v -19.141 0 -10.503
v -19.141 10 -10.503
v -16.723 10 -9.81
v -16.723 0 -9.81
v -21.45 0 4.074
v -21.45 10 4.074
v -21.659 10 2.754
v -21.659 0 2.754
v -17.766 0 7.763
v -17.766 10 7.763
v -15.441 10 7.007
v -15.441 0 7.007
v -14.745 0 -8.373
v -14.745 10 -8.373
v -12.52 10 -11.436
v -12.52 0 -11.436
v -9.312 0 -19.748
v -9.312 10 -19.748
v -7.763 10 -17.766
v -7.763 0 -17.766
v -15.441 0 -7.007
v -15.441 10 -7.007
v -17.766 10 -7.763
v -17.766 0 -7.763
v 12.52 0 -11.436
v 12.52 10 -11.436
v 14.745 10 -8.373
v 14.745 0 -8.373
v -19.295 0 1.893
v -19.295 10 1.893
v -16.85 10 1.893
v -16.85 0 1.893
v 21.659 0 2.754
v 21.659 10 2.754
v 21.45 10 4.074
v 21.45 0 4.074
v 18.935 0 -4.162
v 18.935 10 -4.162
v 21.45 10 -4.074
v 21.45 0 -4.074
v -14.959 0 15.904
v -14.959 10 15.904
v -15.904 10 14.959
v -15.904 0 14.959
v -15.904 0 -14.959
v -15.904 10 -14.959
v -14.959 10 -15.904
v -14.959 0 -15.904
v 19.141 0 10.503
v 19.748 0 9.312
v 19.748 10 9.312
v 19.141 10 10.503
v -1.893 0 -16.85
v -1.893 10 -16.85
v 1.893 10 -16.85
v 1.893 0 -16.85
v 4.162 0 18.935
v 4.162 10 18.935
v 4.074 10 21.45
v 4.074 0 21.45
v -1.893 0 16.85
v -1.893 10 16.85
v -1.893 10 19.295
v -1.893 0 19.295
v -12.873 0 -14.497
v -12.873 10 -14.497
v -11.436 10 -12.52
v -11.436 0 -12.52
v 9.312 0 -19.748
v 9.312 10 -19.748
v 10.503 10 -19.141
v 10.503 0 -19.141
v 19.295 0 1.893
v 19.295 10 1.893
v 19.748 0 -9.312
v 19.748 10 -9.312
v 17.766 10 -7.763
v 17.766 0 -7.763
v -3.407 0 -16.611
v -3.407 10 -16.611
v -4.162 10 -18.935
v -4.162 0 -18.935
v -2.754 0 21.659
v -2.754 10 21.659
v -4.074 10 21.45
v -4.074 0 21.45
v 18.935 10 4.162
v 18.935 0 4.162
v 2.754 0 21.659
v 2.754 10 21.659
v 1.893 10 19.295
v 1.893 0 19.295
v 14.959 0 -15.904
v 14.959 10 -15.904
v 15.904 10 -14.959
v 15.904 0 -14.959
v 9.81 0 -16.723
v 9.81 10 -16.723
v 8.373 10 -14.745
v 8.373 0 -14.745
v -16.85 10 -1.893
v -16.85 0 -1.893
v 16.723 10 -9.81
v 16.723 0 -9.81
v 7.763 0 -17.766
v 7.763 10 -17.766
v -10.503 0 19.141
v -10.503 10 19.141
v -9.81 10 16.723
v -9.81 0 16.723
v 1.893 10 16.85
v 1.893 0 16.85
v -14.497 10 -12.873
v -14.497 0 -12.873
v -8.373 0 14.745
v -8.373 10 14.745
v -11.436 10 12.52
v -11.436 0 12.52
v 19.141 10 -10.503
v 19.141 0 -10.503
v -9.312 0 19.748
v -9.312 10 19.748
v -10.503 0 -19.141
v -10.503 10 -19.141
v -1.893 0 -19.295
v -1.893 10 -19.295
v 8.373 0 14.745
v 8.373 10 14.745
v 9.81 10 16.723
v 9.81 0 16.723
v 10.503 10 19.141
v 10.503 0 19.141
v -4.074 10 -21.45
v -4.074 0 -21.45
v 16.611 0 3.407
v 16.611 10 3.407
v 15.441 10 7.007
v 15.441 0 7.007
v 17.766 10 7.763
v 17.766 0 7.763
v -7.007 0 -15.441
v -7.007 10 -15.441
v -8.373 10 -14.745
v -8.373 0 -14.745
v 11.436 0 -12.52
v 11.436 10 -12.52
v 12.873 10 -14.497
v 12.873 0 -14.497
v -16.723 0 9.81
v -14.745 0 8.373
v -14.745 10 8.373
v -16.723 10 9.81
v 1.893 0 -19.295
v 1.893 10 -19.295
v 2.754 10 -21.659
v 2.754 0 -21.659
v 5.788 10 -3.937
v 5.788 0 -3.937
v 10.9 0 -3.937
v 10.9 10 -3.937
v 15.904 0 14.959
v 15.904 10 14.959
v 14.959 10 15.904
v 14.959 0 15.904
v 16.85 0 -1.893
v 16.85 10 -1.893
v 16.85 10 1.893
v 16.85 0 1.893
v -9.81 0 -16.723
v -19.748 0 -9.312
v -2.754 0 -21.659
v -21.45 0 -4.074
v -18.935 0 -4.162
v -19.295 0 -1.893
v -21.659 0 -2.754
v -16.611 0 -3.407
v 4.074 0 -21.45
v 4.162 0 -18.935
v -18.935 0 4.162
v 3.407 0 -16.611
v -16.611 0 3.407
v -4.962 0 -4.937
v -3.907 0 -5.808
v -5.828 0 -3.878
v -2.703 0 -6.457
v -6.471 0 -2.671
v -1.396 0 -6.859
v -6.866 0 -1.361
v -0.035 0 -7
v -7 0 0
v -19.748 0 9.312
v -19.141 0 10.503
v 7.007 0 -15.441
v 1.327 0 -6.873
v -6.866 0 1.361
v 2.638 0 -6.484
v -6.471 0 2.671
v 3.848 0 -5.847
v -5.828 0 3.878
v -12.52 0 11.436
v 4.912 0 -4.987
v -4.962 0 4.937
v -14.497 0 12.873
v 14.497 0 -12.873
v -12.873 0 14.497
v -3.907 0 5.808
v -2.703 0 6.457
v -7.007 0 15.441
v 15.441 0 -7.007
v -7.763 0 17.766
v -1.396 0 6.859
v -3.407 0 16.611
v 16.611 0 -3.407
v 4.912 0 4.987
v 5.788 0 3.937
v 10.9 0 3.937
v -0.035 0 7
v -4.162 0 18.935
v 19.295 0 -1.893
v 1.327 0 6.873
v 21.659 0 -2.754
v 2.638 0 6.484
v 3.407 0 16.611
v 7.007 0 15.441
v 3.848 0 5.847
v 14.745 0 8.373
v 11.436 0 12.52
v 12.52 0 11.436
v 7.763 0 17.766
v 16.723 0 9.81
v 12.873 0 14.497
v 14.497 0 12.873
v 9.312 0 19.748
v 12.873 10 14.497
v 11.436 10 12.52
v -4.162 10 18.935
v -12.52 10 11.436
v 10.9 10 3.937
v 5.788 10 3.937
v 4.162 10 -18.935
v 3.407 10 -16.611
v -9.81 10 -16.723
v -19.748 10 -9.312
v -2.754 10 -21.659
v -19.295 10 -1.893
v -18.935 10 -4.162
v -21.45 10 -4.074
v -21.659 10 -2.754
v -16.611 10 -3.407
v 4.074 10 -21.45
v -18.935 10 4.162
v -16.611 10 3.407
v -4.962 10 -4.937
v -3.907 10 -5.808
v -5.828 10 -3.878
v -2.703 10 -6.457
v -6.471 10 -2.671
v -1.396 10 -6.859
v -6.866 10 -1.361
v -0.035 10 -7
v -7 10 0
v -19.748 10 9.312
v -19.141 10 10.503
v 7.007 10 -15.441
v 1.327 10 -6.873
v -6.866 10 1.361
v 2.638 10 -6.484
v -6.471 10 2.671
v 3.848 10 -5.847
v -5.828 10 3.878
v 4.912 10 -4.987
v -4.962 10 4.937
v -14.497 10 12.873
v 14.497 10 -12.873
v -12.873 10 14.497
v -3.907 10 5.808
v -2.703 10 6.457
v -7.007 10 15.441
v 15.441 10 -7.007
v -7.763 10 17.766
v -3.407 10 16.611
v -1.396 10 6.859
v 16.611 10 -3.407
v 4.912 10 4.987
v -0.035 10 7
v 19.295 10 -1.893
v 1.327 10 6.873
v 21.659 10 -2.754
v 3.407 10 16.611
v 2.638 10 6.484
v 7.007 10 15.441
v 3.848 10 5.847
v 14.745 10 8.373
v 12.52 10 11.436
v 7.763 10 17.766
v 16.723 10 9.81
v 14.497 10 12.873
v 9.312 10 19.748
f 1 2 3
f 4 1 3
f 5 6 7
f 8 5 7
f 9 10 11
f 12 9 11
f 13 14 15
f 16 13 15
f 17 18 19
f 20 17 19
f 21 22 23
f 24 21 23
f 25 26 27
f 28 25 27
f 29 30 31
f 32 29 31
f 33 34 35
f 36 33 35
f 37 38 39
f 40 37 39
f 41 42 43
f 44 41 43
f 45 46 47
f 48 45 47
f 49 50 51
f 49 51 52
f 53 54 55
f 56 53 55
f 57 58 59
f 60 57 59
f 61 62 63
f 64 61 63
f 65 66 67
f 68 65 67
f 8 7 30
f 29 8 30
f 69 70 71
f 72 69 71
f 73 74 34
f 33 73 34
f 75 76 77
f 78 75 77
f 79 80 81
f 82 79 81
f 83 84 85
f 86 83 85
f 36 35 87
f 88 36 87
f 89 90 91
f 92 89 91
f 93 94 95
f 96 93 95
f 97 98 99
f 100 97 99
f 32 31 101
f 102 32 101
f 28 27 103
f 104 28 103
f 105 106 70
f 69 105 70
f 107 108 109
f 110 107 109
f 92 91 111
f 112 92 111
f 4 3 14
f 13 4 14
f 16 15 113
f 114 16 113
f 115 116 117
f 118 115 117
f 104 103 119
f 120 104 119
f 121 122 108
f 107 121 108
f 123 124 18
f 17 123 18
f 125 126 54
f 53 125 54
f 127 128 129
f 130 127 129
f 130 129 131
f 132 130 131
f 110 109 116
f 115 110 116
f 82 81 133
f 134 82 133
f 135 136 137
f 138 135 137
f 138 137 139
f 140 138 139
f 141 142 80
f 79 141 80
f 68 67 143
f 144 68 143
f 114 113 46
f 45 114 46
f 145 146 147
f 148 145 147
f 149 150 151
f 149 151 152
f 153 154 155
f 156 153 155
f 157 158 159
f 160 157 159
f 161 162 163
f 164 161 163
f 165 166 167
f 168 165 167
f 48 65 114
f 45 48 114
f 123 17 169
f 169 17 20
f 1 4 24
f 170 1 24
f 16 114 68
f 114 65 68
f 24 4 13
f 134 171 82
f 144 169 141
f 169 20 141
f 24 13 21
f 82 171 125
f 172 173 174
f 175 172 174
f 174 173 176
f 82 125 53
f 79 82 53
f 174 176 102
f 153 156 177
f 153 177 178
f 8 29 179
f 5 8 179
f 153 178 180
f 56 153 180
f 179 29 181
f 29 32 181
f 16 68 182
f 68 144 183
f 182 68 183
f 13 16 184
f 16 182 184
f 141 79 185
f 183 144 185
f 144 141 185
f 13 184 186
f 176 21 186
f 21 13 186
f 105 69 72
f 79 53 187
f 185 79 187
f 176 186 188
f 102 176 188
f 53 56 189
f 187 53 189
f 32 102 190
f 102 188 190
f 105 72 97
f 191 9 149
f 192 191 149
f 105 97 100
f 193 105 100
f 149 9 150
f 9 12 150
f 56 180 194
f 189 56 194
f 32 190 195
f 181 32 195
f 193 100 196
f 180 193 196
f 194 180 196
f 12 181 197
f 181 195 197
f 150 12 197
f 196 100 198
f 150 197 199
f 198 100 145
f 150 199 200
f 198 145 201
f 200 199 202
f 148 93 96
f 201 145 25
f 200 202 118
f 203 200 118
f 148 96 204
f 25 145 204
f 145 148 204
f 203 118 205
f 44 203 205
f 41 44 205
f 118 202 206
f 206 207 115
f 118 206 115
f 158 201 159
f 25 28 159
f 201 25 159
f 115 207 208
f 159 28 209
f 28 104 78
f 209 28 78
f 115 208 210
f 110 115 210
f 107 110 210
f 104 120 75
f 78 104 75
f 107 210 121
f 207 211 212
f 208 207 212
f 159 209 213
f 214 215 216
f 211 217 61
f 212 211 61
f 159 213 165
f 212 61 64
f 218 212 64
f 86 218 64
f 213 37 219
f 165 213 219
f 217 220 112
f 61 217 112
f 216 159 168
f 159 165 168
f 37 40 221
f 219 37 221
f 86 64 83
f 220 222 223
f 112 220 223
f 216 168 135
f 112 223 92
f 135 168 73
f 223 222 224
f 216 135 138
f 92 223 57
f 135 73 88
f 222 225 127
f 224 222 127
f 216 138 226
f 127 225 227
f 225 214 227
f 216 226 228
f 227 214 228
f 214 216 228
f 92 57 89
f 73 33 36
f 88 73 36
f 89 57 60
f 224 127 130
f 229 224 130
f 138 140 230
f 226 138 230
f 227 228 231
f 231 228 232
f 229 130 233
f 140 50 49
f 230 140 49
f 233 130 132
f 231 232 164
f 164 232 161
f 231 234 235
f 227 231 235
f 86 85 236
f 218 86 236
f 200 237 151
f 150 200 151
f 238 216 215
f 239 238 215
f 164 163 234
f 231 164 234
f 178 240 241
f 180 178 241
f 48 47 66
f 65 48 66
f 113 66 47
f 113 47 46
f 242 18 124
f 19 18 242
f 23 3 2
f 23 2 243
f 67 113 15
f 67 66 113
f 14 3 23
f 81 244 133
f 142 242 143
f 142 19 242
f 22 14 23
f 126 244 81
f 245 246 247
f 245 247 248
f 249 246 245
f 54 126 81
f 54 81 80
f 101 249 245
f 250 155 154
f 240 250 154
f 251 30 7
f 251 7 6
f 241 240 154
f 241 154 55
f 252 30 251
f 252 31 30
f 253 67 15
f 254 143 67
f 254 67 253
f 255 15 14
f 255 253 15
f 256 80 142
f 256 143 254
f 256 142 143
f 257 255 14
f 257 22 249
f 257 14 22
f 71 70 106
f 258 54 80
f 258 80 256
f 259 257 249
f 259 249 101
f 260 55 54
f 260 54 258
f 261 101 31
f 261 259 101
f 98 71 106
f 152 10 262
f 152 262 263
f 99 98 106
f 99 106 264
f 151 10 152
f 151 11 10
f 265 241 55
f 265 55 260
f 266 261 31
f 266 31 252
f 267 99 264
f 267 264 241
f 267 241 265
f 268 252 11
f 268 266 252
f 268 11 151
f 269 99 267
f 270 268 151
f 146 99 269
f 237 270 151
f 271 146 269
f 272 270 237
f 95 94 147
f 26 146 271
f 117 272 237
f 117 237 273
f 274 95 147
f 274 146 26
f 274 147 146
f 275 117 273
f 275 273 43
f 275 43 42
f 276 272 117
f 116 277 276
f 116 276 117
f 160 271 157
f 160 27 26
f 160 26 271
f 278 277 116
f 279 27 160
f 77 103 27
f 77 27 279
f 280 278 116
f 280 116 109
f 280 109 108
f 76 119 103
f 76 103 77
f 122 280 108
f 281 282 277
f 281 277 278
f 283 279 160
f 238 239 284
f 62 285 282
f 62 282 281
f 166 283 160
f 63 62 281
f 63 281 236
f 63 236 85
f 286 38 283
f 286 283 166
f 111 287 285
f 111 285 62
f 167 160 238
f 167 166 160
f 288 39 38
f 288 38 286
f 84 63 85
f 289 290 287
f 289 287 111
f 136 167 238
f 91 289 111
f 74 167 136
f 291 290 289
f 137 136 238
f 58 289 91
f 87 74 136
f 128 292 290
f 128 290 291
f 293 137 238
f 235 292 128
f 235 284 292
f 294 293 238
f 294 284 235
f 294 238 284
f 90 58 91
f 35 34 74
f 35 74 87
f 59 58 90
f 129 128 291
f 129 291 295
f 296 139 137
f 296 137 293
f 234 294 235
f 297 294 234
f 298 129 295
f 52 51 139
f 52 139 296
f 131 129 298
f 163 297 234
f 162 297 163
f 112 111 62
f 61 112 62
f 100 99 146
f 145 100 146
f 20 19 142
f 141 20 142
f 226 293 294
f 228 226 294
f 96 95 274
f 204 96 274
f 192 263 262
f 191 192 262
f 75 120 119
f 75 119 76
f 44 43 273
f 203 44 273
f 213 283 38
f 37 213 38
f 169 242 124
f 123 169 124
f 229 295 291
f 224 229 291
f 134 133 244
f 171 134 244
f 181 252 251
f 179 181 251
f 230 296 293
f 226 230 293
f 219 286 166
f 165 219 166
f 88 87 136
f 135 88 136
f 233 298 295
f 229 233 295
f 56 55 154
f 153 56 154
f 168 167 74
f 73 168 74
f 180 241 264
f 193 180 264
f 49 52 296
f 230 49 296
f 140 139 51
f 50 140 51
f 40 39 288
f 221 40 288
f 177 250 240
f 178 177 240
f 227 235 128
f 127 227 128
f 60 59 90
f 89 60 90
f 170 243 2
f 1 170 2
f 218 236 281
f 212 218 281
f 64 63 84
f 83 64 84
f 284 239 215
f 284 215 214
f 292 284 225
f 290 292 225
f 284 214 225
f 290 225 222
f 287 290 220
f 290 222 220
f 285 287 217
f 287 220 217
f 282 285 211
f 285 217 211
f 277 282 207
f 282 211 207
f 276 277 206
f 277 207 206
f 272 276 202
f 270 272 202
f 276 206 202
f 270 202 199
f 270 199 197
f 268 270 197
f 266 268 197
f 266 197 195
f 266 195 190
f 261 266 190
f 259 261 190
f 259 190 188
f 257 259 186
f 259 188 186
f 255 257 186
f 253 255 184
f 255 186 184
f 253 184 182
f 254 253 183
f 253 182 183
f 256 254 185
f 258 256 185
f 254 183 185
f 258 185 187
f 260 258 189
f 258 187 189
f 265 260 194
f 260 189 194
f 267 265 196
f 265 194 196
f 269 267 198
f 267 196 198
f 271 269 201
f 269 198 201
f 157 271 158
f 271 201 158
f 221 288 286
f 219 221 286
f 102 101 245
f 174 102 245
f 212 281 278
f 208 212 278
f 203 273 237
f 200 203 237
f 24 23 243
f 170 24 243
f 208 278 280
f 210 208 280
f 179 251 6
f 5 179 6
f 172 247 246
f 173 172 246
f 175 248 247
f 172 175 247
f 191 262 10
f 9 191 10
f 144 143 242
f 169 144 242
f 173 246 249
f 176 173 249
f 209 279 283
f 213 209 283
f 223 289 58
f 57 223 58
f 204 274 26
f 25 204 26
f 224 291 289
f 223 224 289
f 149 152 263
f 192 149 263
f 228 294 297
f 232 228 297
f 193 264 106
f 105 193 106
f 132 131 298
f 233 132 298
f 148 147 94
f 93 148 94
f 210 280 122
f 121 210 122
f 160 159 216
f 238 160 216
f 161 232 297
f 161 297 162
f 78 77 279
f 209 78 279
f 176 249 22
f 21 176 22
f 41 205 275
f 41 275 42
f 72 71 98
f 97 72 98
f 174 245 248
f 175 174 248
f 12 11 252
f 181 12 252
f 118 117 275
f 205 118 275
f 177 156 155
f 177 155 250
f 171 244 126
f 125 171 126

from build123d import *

# Parameters (mm, degrees)
SKETCH_1_R               = 25
EXTRUDE_1_DEPTH          = 10
CUT_EXTRUDE_1_DEPTH      = 37.742346142
PATTERN_CIRCULAR_1_COUNT = 20
CUT_EXTRUDE_2_DEPTH      = 37.334492668
PATTERN_CIRCULAR_2_COUNT = 20


with BuildPart() as part:
    # 草图1 → 凸台-拉伸1 (new body)
    with BuildSketch(Plane(origin=(0, 0, 0), x_dir=(1, 0, 0), z_dir=(0, 1, 0))):
        with Locations(Location((0, 0, 0), (0, 0, 270))):
            Circle(SKETCH_1_R)
        with BuildLine():
            Line((5.788177086, 3.936623684), (10.900331071, 3.936623684))
            Line((10.900331071, 3.936623684), (10.900331071, -3.936623684))
            Line((10.900331071, -3.936623684), (5.788177086, -3.936623684))
            ThreePointArc((5.788177086, -3.936623684), (-7, 0), (5.788177086, 3.936623684))
        make_face(mode=Mode.SUBTRACT)
    extrude(amount=EXTRUDE_1_DEPTH)

    # 草图2 → 切除-拉伸1 (cut, symmetric)
    with BuildSketch(Plane(origin=(0, 10, 0), x_dir=(1, 0, 0), z_dir=(0, 1, 0))):
        Polygon((-1.89299605, 16.850353612), (1.89299605, 16.850353612), (1.89299605, 19.294888065), (6.011008964, 30.60903556), (-6.011008964, 30.60903556), (-1.89299605, 19.294888065), align=None)
    cut_extrude_1 = extrude(amount=CUT_EXTRUDE_1_DEPTH, both=True, mode=Mode.SUBTRACT)

    # 阵列(圆周)1: 切除-拉伸1 ×20 about axis
    pattern_circular_1_axis = Axis((0, 0, 0), (0, 1, 0))
    for i in range(1, PATTERN_CIRCULAR_1_COUNT):
        add(cut_extrude_1.rotate(pattern_circular_1_axis, i * 360 / PATTERN_CIRCULAR_1_COUNT), mode=Mode.SUBTRACT)

    # 草图4 → 切除-拉伸2 (cut, symmetric)
    with BuildSketch(Plane(origin=(0, 0, 0), x_dir=(1, 0, 0), z_dir=(0, 1, 0))):
        Polygon((-5.064708137, 21.29319636), (-2.398933181, 21.715413634), (-3.215562642, 26.871409132), (-6.421705824, 26.363605939), align=None)
    cut_extrude_2 = extrude(amount=CUT_EXTRUDE_2_DEPTH, both=True, mode=Mode.SUBTRACT)

    # 阵列(圆周)2: 切除-拉伸2 ×20 about axis
    pattern_circular_2_axis = Axis((0, 0, 0), (0, 1, 0))
    for i in range(1, PATTERN_CIRCULAR_2_COUNT):
        add(cut_extrude_2.rotate(pattern_circular_2_axis, i * 360 / PATTERN_CIRCULAR_2_COUNT), mode=Mode.SUBTRACT)


solid = part.part
